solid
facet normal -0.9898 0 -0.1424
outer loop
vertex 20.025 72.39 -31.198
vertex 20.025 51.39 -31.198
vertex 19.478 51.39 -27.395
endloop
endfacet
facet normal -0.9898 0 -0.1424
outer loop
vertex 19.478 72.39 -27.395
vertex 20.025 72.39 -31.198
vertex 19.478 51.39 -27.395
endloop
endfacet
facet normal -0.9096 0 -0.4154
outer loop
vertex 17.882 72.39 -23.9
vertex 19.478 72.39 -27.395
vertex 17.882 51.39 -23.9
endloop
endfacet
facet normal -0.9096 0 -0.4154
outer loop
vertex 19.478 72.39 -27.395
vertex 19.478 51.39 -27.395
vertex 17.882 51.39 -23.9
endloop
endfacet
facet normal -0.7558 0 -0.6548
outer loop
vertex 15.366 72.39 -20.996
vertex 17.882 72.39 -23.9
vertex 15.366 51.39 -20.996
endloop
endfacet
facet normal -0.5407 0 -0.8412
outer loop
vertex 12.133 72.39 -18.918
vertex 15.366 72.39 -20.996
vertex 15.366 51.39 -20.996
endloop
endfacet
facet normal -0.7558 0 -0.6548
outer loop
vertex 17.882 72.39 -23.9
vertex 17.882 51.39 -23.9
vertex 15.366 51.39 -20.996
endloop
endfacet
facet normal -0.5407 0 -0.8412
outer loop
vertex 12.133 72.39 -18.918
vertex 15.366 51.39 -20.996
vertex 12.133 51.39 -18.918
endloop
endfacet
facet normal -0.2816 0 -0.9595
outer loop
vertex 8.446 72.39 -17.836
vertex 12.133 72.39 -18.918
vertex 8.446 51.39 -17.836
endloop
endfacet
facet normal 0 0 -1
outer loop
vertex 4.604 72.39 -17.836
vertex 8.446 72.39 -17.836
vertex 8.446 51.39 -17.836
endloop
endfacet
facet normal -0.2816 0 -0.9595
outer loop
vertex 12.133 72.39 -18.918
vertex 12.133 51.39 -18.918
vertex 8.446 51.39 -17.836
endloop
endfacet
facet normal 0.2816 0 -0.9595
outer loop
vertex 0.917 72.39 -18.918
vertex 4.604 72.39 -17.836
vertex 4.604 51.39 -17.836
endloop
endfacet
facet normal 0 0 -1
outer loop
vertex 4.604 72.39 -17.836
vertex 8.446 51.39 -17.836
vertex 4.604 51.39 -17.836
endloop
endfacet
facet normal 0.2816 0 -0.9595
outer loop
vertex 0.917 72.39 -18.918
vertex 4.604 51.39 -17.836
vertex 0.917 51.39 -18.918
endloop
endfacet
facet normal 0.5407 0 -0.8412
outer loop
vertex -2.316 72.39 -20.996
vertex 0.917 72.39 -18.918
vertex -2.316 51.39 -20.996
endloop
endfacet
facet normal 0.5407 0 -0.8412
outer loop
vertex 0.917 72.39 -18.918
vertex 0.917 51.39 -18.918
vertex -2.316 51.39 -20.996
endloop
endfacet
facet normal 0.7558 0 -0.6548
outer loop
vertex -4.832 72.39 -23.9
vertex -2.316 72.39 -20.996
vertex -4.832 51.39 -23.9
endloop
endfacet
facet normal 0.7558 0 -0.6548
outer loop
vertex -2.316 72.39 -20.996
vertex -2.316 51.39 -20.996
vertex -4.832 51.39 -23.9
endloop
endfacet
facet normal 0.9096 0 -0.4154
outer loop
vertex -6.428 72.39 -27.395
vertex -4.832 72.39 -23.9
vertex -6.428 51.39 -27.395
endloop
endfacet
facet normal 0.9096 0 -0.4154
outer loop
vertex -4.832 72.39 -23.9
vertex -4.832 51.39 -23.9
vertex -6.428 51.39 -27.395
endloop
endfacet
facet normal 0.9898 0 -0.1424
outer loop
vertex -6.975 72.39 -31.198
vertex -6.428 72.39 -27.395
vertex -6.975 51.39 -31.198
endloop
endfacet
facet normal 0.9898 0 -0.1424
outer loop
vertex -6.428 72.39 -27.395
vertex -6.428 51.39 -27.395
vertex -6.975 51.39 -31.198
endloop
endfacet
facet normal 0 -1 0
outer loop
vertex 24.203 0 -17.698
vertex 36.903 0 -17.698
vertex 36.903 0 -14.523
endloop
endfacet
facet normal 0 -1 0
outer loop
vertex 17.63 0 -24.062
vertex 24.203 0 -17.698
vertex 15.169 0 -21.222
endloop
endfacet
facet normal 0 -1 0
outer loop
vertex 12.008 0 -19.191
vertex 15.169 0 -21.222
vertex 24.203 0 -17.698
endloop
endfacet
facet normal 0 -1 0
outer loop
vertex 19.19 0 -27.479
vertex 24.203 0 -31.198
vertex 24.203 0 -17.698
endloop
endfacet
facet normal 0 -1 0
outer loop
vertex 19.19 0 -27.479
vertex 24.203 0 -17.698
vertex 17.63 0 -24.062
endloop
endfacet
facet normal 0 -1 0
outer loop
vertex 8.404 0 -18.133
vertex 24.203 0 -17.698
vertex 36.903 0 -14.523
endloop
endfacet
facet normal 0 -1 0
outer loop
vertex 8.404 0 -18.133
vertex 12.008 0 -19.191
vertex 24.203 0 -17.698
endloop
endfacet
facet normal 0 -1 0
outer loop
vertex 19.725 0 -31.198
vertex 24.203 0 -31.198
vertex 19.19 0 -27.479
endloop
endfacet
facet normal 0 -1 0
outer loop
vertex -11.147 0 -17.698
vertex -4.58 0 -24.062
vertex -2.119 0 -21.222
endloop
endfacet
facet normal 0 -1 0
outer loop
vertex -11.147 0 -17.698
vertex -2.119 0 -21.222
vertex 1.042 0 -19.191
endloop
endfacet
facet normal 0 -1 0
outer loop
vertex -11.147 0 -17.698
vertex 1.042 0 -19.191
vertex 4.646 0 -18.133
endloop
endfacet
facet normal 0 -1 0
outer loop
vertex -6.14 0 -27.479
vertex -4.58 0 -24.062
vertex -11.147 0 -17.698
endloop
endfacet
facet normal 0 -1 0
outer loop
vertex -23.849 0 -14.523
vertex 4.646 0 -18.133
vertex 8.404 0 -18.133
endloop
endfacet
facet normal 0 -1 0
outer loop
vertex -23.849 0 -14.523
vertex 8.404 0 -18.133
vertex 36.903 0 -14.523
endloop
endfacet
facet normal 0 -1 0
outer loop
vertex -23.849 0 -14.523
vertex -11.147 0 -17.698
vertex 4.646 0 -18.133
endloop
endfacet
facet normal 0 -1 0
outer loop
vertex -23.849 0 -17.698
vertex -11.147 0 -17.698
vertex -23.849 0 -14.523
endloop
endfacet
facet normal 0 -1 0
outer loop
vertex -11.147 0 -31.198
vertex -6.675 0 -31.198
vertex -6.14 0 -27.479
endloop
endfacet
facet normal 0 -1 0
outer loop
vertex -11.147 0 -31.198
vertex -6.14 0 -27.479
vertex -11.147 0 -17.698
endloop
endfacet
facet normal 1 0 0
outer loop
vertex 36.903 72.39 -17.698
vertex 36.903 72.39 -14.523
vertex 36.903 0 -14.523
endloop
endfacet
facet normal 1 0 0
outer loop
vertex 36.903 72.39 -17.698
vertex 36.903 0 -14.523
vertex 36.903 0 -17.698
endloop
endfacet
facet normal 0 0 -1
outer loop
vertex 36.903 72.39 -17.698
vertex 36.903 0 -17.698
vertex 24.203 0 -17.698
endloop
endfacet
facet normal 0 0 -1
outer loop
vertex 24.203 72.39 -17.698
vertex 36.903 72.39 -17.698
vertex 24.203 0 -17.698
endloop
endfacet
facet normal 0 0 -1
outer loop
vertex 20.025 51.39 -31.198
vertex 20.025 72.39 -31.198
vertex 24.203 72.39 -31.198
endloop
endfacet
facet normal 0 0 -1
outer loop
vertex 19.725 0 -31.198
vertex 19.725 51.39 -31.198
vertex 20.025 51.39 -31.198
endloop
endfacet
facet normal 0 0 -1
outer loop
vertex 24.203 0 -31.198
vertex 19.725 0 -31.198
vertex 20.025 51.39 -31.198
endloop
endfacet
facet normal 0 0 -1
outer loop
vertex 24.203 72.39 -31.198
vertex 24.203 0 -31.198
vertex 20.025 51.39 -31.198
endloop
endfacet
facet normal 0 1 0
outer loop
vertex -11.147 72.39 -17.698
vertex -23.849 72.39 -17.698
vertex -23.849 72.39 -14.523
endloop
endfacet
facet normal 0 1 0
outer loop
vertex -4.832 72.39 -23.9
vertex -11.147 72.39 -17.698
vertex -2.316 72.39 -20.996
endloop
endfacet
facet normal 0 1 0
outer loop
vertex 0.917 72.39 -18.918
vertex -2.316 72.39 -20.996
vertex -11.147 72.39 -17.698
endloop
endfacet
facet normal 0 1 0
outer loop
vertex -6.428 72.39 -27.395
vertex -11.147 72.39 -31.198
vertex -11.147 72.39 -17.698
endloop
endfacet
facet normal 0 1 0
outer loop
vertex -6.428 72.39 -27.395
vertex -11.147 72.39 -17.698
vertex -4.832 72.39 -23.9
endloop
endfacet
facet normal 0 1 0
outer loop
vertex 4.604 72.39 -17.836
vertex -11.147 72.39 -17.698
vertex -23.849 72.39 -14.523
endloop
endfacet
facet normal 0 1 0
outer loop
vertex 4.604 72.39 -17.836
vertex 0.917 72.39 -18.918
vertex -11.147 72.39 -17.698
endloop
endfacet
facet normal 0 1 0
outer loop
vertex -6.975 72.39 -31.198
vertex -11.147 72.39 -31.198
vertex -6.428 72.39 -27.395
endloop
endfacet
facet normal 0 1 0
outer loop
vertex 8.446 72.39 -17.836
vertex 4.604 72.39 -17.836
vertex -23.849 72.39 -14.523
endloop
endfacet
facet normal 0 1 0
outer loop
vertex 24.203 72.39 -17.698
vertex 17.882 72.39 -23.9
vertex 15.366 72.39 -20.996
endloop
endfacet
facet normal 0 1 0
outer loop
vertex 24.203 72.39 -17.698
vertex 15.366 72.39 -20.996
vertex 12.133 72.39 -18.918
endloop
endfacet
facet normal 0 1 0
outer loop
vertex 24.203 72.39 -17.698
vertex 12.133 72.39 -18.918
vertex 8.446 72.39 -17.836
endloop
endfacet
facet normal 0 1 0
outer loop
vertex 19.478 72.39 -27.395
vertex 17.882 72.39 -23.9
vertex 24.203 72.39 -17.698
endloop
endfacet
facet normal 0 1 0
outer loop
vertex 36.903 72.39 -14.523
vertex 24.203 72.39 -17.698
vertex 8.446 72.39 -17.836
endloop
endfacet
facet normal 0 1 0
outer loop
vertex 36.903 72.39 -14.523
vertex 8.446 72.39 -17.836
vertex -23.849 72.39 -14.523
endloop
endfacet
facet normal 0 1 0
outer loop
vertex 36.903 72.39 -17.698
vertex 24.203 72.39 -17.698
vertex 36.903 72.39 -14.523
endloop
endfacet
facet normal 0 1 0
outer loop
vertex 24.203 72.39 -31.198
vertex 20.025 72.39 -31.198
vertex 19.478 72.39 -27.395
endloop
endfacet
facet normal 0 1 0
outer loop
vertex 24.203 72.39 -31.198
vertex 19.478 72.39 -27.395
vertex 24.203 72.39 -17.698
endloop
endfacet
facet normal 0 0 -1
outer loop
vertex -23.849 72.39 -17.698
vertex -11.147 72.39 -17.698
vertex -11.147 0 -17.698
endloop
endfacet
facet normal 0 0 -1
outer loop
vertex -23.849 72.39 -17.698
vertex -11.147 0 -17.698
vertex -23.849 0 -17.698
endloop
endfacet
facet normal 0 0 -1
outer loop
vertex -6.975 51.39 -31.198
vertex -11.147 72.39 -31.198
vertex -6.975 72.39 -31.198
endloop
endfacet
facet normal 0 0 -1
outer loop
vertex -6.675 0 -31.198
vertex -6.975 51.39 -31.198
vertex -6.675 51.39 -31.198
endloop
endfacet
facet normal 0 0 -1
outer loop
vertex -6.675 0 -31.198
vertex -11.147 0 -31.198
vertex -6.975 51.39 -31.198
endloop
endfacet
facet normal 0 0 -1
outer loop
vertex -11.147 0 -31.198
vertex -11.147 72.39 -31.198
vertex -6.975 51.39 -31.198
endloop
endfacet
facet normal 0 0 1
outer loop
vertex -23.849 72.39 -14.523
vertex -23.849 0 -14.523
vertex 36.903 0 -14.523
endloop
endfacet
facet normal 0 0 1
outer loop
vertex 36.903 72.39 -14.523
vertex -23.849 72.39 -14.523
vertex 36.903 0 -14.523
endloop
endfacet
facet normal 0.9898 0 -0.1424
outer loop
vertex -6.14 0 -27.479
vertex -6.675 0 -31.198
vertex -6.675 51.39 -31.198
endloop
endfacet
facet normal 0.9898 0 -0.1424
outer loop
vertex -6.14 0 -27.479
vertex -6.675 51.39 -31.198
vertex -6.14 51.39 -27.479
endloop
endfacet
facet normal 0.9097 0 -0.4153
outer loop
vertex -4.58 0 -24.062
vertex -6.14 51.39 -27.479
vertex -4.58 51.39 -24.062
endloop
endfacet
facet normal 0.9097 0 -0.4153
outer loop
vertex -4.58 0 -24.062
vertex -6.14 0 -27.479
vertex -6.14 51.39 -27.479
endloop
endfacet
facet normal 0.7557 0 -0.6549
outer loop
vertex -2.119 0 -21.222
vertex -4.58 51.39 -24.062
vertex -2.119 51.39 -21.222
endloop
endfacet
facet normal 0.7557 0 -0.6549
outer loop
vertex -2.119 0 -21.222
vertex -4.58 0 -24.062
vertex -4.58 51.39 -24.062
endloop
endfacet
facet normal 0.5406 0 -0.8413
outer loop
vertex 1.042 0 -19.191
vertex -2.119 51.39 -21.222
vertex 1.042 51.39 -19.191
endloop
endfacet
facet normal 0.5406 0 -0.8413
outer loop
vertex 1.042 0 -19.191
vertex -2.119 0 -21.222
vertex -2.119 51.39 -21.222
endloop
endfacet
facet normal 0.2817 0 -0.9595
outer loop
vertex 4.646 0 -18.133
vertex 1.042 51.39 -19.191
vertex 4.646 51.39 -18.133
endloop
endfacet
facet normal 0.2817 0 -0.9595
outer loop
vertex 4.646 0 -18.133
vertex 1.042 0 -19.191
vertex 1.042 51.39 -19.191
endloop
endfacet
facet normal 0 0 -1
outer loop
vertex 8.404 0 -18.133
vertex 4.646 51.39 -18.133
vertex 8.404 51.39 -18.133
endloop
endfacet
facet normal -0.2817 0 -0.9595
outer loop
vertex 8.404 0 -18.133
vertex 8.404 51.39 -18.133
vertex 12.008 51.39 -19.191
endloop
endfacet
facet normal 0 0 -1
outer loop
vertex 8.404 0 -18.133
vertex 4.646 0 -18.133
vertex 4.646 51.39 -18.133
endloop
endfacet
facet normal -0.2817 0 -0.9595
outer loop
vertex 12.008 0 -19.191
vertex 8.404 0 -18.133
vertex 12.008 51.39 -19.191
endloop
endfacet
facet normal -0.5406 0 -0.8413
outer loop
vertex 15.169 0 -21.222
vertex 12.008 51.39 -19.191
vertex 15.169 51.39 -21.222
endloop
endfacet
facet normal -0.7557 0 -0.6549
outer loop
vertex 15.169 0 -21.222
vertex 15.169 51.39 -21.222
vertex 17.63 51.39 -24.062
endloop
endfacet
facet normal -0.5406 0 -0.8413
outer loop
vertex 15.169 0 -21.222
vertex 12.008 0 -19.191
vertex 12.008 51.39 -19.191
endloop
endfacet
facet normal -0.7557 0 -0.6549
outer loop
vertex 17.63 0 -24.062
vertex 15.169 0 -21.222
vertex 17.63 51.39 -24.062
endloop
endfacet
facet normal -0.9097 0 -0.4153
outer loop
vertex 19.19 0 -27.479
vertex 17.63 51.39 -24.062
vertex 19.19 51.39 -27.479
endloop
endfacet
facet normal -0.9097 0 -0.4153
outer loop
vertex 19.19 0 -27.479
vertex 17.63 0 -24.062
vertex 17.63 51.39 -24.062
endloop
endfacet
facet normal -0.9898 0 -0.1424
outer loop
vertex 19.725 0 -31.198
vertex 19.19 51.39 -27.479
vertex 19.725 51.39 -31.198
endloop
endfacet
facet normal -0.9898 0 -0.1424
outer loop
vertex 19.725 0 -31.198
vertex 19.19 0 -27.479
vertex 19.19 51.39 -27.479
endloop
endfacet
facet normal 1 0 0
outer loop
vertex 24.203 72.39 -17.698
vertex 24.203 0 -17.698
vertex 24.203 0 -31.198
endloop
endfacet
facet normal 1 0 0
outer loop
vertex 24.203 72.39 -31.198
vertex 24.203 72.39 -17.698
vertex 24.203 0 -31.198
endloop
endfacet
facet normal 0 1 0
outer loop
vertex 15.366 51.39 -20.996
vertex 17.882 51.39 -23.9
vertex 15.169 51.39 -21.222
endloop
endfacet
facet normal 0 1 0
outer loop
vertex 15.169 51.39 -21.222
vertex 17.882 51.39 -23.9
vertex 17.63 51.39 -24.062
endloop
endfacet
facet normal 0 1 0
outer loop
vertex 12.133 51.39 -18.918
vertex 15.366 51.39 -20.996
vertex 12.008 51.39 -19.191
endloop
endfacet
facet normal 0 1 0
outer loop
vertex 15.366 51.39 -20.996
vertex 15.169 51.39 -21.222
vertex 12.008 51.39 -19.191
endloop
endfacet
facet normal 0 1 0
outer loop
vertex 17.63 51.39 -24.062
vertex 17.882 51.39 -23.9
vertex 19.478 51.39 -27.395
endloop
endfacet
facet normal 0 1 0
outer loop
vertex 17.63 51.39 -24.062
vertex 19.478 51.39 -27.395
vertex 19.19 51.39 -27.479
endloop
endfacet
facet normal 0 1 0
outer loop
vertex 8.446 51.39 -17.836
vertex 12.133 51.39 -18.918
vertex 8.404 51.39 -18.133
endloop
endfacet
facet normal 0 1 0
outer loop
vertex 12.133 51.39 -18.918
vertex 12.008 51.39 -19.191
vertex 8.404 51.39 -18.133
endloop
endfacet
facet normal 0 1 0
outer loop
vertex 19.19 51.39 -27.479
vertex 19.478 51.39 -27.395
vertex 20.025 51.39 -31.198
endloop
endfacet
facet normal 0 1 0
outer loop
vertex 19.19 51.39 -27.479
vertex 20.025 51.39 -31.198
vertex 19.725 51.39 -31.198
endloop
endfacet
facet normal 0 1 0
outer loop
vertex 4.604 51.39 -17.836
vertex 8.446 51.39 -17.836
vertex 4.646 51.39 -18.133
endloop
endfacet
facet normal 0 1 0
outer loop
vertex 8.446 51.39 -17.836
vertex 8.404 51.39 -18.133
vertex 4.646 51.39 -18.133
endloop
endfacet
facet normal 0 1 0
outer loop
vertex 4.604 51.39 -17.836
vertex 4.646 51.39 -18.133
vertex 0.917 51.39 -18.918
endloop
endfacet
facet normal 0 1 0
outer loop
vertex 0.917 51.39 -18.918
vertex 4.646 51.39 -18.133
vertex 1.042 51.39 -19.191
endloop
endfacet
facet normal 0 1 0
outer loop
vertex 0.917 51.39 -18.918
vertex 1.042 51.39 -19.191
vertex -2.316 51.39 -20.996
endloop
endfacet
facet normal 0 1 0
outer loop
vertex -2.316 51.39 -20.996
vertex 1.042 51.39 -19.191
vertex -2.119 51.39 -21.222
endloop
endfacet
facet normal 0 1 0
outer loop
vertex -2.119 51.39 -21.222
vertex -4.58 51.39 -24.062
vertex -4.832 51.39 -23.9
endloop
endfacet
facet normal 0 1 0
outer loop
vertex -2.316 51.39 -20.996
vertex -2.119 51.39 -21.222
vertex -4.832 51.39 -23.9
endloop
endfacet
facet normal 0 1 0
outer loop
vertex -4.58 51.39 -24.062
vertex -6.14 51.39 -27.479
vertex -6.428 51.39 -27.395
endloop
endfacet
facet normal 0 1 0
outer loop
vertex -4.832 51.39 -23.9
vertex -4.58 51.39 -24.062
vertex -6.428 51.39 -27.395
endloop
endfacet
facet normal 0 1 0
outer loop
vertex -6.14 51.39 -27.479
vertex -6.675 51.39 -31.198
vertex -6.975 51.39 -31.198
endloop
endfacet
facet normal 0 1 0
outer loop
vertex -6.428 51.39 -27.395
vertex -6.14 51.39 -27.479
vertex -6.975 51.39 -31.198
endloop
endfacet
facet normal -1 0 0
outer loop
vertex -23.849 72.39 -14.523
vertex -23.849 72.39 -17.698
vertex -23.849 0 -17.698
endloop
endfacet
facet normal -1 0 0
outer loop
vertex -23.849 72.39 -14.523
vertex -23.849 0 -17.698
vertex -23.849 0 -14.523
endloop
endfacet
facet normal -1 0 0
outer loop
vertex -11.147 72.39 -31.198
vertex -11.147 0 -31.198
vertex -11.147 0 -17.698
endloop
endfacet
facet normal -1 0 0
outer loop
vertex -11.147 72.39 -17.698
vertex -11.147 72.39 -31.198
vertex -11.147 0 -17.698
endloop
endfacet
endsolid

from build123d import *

# Parameters (mm, degrees)
BOSS_EXTRUDE3_DEPTH = 72.39
BOSS_EXTRUDE4_DEPTH = 51.39


with BuildPart() as part:
    # Sketch1 → Boss-Extrude3 (new body)
    with BuildSketch(Plane(origin=(0, 0, 0), x_dir=(1, 0, 0), z_dir=(0, 1, 0))):
        with BuildLine():
            Line((-11.1466884, 17.698170271), (-23.8485284, 17.698170271))
            Line((-23.8485284, 17.698170271), (-23.8485284, 14.523170271))
            Line((-23.8485284, 14.523170271), (36.9033116, 14.523170271))
            Line((36.9033116, 14.523170271), (36.9033116, 17.698170271))
            Line((36.9033116, 17.698170271), (24.2033116, 17.698170271))
            Line((24.2033116, 17.698170271), (24.2033116, 31.198170271))
            Line((24.2033116, 31.198170271), (20.025, 31.198170271))
            ThreePointArc((20.025, 31.198170271), (6.525, 17.69817027), (-6.975, 31.198170271))
            Line((-6.975, 31.198170271), (-11.1466884, 31.198170271))
            Line((-11.1466884, 31.198170271), (-11.1466884, 17.698170271))
        make_face()
    extrude(amount=BOSS_EXTRUDE3_DEPTH)

    # Sketch1<13> → Boss-Extrude4 (add)
    with BuildSketch(Plane(origin=(0, 0, 0), x_dir=(1, 0, 0), z_dir=(0, 1, 0))):
        with BuildLine():
            Line((-6.975, 31.198170271), (-6.675, 31.198170271))
            ThreePointArc((-6.675, 31.198170271), (6.525, 17.99817027), (19.725, 31.198170271))
            Line((19.725, 31.198170271), (20.025, 31.198170271))
            ThreePointArc((20.025, 31.198170271), (6.525, 17.69817027), (-6.975, 31.198170271))
        make_face()
    extrude(amount=BOSS_EXTRUDE4_DEPTH)


solid = part.part
